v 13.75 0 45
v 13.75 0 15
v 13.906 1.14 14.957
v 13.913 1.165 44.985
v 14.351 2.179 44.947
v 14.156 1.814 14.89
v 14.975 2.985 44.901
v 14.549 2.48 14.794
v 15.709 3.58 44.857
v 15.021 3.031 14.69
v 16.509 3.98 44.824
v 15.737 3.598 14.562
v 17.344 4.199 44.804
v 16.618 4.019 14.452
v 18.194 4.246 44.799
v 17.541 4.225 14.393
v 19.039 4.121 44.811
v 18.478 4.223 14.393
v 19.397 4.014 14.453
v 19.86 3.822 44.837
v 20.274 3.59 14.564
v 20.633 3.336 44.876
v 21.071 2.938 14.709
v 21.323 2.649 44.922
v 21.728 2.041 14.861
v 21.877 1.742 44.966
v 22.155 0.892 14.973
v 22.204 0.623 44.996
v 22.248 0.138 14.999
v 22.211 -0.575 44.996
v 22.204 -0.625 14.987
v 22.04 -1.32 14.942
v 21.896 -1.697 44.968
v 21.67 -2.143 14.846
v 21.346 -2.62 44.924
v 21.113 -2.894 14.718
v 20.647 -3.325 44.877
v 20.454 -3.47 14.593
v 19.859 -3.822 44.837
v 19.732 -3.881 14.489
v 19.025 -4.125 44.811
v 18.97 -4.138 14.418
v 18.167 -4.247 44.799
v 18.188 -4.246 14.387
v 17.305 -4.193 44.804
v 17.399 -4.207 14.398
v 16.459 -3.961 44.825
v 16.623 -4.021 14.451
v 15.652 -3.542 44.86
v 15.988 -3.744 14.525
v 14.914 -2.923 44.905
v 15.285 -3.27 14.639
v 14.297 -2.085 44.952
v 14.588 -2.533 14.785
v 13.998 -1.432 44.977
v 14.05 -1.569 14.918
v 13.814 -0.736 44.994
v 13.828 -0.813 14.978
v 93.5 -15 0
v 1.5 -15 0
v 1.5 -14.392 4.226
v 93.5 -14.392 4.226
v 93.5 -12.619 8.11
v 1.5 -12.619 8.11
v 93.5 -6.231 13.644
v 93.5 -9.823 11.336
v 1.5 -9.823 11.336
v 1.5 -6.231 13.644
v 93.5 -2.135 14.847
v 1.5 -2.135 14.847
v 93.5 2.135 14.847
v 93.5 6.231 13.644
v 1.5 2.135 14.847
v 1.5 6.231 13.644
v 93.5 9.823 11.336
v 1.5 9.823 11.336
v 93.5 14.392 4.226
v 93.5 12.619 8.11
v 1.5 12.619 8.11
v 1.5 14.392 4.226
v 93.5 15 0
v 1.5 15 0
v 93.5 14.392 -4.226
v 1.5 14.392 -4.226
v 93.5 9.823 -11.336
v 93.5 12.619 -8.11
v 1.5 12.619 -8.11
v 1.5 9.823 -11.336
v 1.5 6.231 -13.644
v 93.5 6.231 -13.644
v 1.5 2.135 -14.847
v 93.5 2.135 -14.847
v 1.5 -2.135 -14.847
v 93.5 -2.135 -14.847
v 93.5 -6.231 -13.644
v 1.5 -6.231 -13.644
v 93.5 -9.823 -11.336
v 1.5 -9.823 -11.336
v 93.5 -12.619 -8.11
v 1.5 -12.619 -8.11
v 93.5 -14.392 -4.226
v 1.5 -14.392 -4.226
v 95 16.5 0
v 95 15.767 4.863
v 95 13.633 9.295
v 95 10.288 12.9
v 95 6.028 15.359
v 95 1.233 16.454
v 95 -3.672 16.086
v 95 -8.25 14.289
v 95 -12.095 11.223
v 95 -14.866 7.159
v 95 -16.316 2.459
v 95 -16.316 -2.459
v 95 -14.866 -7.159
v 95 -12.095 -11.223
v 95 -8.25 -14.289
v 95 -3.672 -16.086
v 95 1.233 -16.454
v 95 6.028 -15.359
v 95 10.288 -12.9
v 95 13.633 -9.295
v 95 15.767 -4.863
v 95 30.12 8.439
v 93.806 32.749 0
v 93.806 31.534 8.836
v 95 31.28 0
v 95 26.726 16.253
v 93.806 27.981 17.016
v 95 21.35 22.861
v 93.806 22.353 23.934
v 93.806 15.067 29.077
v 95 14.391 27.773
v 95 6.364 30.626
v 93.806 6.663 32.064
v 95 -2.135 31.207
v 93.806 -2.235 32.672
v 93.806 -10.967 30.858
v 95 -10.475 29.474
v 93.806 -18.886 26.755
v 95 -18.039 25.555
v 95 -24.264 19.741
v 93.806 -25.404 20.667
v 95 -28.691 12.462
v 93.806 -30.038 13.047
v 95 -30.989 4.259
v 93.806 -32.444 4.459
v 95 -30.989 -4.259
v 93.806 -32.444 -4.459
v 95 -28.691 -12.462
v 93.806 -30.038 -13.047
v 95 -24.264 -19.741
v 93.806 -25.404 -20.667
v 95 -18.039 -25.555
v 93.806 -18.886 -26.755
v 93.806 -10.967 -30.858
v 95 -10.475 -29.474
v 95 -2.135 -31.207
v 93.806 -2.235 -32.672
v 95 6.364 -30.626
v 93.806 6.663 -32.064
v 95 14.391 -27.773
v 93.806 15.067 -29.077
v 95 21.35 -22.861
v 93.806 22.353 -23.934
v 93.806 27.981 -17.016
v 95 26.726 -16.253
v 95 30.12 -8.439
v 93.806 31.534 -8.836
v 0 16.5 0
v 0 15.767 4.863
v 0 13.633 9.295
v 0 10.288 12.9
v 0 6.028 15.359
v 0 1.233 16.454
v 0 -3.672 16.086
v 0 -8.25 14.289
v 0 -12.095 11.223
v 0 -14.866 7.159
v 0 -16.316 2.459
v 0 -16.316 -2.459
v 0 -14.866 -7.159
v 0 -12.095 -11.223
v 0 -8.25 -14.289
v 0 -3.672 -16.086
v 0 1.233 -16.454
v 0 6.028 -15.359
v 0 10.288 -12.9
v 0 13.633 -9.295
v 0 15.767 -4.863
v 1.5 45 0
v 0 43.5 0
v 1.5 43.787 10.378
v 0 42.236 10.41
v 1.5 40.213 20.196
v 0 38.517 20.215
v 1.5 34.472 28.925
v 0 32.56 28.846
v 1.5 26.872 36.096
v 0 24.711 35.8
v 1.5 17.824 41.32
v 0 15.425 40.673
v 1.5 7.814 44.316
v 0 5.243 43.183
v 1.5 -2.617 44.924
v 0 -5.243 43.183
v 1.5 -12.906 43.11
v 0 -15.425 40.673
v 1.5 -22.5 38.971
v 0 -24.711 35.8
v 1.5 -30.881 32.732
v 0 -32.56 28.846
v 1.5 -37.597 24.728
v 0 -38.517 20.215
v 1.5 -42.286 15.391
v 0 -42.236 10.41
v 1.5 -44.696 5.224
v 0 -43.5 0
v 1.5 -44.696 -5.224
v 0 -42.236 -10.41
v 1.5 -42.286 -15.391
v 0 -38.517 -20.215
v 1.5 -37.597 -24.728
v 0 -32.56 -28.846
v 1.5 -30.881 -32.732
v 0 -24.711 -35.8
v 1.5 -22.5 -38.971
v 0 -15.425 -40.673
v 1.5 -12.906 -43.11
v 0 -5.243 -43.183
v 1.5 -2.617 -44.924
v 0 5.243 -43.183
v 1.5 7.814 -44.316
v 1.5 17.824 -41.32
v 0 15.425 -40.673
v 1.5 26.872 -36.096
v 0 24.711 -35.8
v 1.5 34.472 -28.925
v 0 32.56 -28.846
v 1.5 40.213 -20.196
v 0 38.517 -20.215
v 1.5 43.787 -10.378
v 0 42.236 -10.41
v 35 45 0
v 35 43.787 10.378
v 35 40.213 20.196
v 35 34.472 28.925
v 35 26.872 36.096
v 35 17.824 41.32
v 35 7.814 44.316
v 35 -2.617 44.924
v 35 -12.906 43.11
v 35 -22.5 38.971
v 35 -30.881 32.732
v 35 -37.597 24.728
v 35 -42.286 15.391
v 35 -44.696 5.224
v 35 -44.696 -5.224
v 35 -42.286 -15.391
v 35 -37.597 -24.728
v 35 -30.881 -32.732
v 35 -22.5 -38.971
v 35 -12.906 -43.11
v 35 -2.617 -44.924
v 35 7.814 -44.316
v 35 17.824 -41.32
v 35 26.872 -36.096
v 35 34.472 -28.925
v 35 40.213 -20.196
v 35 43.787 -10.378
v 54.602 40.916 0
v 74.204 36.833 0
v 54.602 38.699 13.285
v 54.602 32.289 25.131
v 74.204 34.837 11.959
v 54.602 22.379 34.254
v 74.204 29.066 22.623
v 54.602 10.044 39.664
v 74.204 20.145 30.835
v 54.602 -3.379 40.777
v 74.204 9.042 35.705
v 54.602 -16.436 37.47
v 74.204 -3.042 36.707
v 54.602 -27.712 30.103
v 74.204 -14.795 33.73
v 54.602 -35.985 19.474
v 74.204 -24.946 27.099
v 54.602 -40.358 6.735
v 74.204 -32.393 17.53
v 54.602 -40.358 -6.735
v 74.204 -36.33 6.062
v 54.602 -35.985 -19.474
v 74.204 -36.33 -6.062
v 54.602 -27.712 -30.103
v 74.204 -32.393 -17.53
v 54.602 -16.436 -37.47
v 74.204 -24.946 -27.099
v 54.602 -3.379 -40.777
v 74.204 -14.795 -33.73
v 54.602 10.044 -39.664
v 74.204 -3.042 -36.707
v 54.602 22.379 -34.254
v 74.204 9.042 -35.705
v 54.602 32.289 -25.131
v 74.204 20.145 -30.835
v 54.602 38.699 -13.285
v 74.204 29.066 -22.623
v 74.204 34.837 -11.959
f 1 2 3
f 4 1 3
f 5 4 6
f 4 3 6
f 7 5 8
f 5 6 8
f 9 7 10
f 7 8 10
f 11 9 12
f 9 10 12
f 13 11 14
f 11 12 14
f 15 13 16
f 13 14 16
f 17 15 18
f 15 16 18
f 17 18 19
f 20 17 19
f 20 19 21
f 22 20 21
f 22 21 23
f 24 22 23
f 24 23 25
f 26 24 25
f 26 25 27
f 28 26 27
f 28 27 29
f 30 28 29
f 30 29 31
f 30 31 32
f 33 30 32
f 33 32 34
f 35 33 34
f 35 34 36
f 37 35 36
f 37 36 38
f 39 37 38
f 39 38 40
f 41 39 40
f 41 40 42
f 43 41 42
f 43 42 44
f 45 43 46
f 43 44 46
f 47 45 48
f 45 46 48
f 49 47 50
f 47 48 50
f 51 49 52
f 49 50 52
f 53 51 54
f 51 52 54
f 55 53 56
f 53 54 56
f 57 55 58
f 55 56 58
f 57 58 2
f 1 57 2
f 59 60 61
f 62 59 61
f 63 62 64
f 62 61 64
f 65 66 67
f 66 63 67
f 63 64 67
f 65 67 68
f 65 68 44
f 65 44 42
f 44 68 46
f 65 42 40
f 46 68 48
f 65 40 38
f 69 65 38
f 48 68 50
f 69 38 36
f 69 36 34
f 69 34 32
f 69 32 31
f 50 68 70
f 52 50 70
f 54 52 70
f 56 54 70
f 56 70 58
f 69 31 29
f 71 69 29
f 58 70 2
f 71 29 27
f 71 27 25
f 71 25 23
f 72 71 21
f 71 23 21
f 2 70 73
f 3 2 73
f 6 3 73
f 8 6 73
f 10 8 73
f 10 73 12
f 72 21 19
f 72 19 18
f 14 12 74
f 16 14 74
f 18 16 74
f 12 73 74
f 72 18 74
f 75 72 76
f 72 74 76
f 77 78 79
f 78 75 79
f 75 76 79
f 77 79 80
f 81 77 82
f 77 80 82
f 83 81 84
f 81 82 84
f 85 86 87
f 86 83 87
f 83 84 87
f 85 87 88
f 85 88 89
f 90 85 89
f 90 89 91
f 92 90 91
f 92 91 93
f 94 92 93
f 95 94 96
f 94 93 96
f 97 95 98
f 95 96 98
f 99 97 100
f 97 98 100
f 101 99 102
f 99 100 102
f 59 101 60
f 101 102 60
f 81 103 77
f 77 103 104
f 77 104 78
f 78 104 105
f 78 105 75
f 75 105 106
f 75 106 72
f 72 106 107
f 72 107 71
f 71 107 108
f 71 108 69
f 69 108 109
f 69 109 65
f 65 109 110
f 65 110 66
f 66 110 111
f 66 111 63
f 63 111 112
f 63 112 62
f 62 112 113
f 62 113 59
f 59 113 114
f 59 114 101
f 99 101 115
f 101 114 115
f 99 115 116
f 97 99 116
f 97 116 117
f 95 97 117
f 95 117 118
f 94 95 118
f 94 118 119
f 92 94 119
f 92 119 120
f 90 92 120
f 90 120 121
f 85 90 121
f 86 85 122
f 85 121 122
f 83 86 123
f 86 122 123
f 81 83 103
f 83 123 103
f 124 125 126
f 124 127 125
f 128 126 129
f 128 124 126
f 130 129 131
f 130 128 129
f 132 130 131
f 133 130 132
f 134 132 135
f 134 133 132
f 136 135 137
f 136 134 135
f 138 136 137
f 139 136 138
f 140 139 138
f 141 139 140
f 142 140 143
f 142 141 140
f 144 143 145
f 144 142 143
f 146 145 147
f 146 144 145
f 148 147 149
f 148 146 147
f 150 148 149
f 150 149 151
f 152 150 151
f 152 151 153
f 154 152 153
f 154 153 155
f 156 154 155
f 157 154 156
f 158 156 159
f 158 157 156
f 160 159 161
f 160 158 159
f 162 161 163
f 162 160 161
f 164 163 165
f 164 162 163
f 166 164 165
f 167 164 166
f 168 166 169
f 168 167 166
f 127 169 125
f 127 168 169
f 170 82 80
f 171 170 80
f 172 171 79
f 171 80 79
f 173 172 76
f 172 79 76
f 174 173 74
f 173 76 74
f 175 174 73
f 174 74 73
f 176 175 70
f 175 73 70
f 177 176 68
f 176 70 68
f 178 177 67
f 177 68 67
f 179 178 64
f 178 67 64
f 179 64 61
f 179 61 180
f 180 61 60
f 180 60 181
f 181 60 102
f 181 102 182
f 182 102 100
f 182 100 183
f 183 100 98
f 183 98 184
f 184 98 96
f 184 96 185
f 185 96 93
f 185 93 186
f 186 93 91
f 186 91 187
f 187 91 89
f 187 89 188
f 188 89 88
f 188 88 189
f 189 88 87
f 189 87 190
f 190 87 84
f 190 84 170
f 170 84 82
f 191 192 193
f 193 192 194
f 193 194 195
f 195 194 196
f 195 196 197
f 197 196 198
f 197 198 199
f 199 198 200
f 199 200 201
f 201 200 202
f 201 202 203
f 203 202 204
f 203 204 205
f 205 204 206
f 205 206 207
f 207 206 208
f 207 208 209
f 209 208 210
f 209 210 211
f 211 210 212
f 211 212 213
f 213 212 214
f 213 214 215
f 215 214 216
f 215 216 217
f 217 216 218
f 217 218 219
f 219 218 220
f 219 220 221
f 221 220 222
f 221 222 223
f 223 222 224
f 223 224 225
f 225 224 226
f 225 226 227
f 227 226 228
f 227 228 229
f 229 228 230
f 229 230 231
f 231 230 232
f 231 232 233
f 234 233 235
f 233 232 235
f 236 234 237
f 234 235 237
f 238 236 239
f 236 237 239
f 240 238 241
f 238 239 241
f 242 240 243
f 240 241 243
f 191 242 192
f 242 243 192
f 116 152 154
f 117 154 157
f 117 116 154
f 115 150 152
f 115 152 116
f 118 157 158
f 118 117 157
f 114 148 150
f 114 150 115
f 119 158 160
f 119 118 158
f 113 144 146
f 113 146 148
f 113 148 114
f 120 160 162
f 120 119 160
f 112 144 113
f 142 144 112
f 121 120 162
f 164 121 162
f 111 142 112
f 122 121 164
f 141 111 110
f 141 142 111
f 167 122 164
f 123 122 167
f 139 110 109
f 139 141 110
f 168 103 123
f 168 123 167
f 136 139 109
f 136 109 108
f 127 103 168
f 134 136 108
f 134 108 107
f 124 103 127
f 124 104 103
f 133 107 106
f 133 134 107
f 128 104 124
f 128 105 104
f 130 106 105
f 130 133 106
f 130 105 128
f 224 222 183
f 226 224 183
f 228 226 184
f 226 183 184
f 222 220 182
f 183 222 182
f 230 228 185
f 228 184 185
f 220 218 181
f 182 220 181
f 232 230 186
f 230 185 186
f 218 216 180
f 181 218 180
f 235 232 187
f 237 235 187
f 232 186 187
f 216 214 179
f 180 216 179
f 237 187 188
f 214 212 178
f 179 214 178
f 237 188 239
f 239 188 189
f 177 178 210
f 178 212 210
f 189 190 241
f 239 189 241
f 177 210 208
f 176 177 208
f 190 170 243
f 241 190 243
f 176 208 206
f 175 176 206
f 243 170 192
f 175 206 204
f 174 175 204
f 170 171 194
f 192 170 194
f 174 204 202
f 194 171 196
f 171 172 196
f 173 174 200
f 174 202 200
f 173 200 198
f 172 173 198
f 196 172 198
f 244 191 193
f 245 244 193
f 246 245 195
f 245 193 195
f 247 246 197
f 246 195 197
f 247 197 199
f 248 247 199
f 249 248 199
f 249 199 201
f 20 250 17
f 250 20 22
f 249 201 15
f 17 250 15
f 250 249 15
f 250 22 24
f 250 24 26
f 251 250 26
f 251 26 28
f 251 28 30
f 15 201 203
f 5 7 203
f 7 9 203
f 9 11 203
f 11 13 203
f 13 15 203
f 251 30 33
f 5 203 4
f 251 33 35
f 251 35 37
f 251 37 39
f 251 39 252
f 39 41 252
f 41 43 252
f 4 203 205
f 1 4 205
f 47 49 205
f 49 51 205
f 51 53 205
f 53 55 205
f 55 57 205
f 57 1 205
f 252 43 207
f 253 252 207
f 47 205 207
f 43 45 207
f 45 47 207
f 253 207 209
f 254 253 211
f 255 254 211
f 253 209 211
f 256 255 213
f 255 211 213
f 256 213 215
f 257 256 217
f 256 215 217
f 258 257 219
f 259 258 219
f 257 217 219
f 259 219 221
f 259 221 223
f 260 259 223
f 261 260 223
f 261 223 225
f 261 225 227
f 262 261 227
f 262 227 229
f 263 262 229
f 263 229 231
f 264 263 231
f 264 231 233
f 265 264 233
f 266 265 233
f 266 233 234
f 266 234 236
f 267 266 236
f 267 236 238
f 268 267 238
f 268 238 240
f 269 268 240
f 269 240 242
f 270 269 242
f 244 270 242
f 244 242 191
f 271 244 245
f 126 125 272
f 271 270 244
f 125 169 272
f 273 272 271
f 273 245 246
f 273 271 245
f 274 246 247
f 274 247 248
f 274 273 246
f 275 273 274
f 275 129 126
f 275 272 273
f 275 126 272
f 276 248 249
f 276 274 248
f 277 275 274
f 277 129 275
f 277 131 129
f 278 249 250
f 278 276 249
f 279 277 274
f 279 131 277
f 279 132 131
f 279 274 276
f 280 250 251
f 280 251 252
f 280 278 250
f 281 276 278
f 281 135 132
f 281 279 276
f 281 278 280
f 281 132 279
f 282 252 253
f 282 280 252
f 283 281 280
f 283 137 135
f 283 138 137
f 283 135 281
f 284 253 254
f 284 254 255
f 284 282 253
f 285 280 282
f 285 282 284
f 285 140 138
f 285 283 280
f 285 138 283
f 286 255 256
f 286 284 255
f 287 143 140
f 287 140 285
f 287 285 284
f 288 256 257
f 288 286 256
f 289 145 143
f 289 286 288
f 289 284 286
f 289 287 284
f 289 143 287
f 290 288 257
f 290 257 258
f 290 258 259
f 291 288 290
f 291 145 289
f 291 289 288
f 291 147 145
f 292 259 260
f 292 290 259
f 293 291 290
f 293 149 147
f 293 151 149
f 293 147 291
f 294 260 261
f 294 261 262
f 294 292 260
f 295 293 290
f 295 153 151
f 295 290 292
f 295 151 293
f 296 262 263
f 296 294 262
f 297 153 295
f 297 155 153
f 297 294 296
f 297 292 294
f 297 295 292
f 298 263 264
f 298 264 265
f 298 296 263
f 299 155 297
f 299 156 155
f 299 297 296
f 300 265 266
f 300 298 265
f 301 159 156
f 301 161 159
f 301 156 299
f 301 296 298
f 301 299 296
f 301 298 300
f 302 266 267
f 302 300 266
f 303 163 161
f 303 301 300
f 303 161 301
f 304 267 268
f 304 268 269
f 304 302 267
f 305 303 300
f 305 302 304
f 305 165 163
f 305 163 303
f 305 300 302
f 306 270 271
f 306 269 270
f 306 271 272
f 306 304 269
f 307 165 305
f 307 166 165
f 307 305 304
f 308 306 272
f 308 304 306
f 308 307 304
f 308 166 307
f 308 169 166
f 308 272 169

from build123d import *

# Parameters (mm, degrees)
F0_R      = 45
F3_DEPTH  = 35
F4_R      = 45
F2_R      = 32.5
F9_D      = 30
F10_D     = 8.5
F10_DEPTH = 45
F10_START = 0.2011441
F10_TIP   = 2.5536576309


# Not quite as in the source:
# - a fillet or chamfer that OpenCascade refuses, or shapes differently, is made with other operations: its cross-section is extruded or revolved along the edge and cut away or added


with BuildPart() as f3:
    # F0 (on Right) → F3 (new body)
    with BuildSketch(Plane.YZ):
        Circle(F0_R)
    extrude(amount=F3_DEPTH)

    # F4 (on face) → F5 section 0
    with BuildSketch(Plane.YZ.offset(35)):
        Circle(F4_R)
    # F2 (on offset) → F5 section 1
    with BuildSketch(Plane.YZ.offset(95)):
        Circle(F2_R)
    loft()

    # F9 (through all)
    with Locations(Plane.YZ.offset(95)):
        with Locations((0, 0)):
            Hole(F9_D / 2)

    # F10
    # its depths count from where the whole tool has entered the part; down to there all is cleared
    with Locations(Plane.XY.offset(45).offset(-F10_START)):
        with Locations((18, 0)):
            Hole(F10_D / 2, depth=F10_DEPTH)
            with Locations((0, 0, -(F10_DEPTH + F10_TIP / 2))):  # 118° drill point
                Cone(0, F10_D / 2, F10_TIP, mode=Mode.SUBTRACT)

    # F11: chamfer of 1.5 on 4 edges, made by hand

    # F11_s1 → F11_t2 (revolve, cut)
    with BuildSketch(Plane.XY):
        Polygon((93.8059313812, 32.7487642956), (95, 31.280293666), (95, 32.5), align=None)
    revolve(axis=Axis((95, 0, 0), (1, 0, 0)), mode=Mode.SUBTRACT)

    # F11_s3 → F11_t4 (revolve, cut)
    with BuildSketch(Plane.XY):
        Polygon((1.5, 45), (0, 43.5), (0, 45), align=None)
    revolve(axis=Axis((0, 0, 0), (1, 0, 0)), mode=Mode.SUBTRACT)

    # F11_s5 → F11_t6 (revolve, cut)
    with BuildSketch(Plane.XY):
        Polygon((0, 16.5), (1.5, 15), (0, 15), align=None)
    revolve(axis=Axis((0, 0, 0), (1, 0, 0)), mode=Mode.SUBTRACT)

    # F11_s7 → F11_t8 (revolve, cut)
    with BuildSketch(Plane.XY):
        Polygon((93.5, 15), (95, 16.5), (95, 15), align=None)
    revolve(axis=Axis((95, 0, 0), (1, 0, 0)), mode=Mode.SUBTRACT)


solid = f3.part
